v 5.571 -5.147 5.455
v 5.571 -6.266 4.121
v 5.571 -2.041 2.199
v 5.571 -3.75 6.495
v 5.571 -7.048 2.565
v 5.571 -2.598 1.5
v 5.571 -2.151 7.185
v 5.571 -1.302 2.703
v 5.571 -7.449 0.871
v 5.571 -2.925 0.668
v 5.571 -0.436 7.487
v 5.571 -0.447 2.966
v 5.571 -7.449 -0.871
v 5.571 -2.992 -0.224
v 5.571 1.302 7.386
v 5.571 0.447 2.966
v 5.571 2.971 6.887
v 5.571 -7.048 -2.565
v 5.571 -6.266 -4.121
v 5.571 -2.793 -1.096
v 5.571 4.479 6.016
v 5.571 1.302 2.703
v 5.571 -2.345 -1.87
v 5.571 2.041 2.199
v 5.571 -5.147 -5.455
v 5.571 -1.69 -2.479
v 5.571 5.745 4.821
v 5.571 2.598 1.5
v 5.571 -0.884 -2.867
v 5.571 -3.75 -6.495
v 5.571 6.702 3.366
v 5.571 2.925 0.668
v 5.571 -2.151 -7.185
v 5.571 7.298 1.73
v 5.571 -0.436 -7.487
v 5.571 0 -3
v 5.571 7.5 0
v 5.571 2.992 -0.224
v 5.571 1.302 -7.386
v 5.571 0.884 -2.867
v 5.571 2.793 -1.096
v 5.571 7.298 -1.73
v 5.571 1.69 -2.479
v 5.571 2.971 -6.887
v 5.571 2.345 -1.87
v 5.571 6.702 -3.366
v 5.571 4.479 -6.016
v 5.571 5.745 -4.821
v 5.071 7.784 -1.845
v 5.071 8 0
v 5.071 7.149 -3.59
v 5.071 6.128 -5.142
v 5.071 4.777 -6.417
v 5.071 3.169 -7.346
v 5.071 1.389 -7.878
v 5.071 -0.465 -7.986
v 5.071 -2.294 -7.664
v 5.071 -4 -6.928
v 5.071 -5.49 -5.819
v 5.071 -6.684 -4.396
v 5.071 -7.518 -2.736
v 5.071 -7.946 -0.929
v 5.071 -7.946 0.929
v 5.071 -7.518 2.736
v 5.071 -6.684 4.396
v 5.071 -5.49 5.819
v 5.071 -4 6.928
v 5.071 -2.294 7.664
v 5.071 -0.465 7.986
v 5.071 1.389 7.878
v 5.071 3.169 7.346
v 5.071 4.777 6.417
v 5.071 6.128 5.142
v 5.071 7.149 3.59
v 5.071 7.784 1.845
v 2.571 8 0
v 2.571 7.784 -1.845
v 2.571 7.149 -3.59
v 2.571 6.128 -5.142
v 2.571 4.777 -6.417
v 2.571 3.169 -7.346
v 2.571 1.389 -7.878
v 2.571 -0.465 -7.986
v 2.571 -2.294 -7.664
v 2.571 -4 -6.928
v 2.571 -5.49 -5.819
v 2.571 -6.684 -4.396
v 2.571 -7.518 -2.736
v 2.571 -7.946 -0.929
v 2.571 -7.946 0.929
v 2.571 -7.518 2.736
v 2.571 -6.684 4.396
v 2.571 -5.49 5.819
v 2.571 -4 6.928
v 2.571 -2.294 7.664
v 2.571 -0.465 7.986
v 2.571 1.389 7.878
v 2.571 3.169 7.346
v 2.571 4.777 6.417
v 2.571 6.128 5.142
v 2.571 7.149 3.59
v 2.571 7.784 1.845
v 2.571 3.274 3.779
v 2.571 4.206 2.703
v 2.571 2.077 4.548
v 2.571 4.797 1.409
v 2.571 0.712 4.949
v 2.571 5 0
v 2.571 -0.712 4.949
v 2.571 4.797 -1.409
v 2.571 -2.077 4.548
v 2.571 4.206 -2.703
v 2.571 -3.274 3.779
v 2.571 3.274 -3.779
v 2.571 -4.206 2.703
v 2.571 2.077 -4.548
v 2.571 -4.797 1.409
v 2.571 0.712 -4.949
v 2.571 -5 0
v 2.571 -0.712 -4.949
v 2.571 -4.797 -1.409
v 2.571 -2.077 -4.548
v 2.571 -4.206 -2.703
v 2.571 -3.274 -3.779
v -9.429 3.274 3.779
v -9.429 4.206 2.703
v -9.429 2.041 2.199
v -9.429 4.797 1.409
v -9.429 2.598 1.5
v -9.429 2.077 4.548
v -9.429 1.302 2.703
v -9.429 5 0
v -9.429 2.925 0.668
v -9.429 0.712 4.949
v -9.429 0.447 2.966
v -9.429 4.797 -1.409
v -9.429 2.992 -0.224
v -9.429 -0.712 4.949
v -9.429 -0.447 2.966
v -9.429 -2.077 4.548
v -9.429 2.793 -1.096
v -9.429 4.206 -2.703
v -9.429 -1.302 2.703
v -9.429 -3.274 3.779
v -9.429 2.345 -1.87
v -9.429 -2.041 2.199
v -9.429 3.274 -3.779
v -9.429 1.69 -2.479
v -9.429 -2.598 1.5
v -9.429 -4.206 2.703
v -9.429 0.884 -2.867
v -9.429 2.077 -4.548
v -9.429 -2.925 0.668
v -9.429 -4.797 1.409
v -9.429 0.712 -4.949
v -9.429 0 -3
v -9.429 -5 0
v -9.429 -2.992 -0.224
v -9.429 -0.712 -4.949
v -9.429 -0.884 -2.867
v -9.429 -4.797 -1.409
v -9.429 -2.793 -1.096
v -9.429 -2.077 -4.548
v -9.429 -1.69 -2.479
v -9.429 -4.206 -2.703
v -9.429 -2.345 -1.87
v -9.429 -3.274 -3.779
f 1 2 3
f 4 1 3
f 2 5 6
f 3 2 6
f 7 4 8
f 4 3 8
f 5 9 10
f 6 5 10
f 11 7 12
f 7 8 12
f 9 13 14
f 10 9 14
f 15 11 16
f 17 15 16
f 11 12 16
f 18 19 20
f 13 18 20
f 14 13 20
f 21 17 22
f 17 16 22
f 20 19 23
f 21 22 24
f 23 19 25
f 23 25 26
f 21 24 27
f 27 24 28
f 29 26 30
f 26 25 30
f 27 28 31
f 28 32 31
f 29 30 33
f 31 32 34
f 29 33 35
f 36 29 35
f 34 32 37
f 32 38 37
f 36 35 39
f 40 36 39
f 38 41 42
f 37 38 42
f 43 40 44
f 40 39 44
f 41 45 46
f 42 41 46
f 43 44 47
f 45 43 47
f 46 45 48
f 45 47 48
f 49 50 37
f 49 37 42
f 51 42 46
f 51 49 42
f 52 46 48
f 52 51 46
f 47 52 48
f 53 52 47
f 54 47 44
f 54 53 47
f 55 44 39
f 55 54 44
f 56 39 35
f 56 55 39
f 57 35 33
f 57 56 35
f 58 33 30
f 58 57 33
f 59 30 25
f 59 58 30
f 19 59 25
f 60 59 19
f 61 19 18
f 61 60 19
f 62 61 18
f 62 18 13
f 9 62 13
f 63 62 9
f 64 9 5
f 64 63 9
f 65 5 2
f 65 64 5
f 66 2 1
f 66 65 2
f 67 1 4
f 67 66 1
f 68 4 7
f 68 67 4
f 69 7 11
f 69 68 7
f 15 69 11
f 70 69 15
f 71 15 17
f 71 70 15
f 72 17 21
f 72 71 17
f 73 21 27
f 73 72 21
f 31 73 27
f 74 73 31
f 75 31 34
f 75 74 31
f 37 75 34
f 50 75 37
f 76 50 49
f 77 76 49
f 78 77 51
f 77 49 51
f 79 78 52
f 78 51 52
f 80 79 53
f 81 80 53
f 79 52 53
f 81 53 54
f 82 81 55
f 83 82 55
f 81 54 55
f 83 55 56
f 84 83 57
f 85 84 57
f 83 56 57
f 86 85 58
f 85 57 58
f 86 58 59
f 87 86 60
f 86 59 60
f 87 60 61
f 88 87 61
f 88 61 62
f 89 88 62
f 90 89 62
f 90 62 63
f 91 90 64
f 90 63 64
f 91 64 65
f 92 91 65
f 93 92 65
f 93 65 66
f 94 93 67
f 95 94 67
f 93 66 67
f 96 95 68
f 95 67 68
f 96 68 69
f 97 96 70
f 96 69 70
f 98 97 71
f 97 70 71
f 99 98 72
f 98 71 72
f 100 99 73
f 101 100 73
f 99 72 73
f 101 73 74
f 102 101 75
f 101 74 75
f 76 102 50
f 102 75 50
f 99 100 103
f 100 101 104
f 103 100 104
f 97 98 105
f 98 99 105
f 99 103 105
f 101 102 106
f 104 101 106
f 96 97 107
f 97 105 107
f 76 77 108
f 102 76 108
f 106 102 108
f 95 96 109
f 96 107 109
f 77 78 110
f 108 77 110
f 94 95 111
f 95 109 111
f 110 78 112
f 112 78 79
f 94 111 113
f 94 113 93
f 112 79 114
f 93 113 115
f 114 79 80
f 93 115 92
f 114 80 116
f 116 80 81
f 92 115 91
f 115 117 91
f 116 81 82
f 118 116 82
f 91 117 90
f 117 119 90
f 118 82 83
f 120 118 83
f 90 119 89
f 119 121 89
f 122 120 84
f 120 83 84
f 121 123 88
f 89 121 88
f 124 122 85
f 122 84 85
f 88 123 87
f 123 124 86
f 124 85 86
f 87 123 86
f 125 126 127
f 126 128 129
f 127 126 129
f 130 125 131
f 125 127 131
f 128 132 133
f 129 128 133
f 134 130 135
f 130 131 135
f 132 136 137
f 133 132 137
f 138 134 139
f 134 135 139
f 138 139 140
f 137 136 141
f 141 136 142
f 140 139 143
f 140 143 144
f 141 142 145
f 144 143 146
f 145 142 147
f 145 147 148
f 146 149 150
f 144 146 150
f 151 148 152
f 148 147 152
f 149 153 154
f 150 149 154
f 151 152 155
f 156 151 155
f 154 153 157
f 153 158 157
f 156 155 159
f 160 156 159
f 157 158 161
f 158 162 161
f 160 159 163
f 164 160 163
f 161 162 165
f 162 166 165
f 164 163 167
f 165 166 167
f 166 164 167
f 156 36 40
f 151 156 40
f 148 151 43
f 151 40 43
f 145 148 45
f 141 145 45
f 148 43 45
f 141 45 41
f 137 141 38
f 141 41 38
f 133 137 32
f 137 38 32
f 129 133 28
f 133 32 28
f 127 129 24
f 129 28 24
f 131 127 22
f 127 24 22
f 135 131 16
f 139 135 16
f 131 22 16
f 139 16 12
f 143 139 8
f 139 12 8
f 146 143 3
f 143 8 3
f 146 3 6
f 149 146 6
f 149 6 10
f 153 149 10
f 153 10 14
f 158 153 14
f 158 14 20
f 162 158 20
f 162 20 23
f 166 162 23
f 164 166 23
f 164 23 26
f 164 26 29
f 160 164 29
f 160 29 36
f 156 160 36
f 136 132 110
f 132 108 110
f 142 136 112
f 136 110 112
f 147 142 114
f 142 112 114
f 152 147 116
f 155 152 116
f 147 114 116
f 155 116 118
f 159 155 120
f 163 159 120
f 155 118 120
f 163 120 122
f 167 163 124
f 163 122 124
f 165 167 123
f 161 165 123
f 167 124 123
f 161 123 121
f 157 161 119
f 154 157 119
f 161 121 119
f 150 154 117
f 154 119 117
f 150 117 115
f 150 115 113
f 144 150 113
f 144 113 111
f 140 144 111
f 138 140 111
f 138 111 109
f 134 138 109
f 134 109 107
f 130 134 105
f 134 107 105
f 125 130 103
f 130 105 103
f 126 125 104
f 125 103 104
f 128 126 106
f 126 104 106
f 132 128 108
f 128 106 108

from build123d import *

# Parameters (mm, degrees)
HOLE_WIZARD_6_0_6_1_D     = 6
HOLE_WIZARD_6_0_6_1_DEPTH = 18.197418143
HOLE_WIZARD_6_0_6_1_TIP   = 1.802581857
CHAMFER_1_SIZE            = 0.5


with BuildPart() as part:
    # 草图1 → 旋转1 (revolve)
    with BuildSketch(Plane.XY):
        Polygon((-9.428571429, 0), (-9.428571429, 5), (2.571428571, 5), (2.571428571, 8), (5.571428571, 8), (5.571428571, 0), align=None)
    revolve(axis=Axis((5.571428571, 0, 0), (-1, 0, 0)))

    # Ø6.0 (6) 直径孔1
    with Locations(Plane.ZY.offset(9.428571429)):
        with Locations((0, 0)):
            Hole(HOLE_WIZARD_6_0_6_1_D / 2, depth=HOLE_WIZARD_6_0_6_1_DEPTH)
            with Locations((0, 0, -(HOLE_WIZARD_6_0_6_1_DEPTH + HOLE_WIZARD_6_0_6_1_TIP / 2))):  # 118° drill point
                Cone(0, HOLE_WIZARD_6_0_6_1_D / 2, HOLE_WIZARD_6_0_6_1_TIP, mode=Mode.SUBTRACT)

    # 倒角1
    chamfer_1_edges = [part.edges().sort_by_distance(p)[0] for p in [
        (5.571428571, -8, 0),
    ]]
    chamfer(chamfer_1_edges, length=CHAMFER_1_SIZE)


solid = part.part
